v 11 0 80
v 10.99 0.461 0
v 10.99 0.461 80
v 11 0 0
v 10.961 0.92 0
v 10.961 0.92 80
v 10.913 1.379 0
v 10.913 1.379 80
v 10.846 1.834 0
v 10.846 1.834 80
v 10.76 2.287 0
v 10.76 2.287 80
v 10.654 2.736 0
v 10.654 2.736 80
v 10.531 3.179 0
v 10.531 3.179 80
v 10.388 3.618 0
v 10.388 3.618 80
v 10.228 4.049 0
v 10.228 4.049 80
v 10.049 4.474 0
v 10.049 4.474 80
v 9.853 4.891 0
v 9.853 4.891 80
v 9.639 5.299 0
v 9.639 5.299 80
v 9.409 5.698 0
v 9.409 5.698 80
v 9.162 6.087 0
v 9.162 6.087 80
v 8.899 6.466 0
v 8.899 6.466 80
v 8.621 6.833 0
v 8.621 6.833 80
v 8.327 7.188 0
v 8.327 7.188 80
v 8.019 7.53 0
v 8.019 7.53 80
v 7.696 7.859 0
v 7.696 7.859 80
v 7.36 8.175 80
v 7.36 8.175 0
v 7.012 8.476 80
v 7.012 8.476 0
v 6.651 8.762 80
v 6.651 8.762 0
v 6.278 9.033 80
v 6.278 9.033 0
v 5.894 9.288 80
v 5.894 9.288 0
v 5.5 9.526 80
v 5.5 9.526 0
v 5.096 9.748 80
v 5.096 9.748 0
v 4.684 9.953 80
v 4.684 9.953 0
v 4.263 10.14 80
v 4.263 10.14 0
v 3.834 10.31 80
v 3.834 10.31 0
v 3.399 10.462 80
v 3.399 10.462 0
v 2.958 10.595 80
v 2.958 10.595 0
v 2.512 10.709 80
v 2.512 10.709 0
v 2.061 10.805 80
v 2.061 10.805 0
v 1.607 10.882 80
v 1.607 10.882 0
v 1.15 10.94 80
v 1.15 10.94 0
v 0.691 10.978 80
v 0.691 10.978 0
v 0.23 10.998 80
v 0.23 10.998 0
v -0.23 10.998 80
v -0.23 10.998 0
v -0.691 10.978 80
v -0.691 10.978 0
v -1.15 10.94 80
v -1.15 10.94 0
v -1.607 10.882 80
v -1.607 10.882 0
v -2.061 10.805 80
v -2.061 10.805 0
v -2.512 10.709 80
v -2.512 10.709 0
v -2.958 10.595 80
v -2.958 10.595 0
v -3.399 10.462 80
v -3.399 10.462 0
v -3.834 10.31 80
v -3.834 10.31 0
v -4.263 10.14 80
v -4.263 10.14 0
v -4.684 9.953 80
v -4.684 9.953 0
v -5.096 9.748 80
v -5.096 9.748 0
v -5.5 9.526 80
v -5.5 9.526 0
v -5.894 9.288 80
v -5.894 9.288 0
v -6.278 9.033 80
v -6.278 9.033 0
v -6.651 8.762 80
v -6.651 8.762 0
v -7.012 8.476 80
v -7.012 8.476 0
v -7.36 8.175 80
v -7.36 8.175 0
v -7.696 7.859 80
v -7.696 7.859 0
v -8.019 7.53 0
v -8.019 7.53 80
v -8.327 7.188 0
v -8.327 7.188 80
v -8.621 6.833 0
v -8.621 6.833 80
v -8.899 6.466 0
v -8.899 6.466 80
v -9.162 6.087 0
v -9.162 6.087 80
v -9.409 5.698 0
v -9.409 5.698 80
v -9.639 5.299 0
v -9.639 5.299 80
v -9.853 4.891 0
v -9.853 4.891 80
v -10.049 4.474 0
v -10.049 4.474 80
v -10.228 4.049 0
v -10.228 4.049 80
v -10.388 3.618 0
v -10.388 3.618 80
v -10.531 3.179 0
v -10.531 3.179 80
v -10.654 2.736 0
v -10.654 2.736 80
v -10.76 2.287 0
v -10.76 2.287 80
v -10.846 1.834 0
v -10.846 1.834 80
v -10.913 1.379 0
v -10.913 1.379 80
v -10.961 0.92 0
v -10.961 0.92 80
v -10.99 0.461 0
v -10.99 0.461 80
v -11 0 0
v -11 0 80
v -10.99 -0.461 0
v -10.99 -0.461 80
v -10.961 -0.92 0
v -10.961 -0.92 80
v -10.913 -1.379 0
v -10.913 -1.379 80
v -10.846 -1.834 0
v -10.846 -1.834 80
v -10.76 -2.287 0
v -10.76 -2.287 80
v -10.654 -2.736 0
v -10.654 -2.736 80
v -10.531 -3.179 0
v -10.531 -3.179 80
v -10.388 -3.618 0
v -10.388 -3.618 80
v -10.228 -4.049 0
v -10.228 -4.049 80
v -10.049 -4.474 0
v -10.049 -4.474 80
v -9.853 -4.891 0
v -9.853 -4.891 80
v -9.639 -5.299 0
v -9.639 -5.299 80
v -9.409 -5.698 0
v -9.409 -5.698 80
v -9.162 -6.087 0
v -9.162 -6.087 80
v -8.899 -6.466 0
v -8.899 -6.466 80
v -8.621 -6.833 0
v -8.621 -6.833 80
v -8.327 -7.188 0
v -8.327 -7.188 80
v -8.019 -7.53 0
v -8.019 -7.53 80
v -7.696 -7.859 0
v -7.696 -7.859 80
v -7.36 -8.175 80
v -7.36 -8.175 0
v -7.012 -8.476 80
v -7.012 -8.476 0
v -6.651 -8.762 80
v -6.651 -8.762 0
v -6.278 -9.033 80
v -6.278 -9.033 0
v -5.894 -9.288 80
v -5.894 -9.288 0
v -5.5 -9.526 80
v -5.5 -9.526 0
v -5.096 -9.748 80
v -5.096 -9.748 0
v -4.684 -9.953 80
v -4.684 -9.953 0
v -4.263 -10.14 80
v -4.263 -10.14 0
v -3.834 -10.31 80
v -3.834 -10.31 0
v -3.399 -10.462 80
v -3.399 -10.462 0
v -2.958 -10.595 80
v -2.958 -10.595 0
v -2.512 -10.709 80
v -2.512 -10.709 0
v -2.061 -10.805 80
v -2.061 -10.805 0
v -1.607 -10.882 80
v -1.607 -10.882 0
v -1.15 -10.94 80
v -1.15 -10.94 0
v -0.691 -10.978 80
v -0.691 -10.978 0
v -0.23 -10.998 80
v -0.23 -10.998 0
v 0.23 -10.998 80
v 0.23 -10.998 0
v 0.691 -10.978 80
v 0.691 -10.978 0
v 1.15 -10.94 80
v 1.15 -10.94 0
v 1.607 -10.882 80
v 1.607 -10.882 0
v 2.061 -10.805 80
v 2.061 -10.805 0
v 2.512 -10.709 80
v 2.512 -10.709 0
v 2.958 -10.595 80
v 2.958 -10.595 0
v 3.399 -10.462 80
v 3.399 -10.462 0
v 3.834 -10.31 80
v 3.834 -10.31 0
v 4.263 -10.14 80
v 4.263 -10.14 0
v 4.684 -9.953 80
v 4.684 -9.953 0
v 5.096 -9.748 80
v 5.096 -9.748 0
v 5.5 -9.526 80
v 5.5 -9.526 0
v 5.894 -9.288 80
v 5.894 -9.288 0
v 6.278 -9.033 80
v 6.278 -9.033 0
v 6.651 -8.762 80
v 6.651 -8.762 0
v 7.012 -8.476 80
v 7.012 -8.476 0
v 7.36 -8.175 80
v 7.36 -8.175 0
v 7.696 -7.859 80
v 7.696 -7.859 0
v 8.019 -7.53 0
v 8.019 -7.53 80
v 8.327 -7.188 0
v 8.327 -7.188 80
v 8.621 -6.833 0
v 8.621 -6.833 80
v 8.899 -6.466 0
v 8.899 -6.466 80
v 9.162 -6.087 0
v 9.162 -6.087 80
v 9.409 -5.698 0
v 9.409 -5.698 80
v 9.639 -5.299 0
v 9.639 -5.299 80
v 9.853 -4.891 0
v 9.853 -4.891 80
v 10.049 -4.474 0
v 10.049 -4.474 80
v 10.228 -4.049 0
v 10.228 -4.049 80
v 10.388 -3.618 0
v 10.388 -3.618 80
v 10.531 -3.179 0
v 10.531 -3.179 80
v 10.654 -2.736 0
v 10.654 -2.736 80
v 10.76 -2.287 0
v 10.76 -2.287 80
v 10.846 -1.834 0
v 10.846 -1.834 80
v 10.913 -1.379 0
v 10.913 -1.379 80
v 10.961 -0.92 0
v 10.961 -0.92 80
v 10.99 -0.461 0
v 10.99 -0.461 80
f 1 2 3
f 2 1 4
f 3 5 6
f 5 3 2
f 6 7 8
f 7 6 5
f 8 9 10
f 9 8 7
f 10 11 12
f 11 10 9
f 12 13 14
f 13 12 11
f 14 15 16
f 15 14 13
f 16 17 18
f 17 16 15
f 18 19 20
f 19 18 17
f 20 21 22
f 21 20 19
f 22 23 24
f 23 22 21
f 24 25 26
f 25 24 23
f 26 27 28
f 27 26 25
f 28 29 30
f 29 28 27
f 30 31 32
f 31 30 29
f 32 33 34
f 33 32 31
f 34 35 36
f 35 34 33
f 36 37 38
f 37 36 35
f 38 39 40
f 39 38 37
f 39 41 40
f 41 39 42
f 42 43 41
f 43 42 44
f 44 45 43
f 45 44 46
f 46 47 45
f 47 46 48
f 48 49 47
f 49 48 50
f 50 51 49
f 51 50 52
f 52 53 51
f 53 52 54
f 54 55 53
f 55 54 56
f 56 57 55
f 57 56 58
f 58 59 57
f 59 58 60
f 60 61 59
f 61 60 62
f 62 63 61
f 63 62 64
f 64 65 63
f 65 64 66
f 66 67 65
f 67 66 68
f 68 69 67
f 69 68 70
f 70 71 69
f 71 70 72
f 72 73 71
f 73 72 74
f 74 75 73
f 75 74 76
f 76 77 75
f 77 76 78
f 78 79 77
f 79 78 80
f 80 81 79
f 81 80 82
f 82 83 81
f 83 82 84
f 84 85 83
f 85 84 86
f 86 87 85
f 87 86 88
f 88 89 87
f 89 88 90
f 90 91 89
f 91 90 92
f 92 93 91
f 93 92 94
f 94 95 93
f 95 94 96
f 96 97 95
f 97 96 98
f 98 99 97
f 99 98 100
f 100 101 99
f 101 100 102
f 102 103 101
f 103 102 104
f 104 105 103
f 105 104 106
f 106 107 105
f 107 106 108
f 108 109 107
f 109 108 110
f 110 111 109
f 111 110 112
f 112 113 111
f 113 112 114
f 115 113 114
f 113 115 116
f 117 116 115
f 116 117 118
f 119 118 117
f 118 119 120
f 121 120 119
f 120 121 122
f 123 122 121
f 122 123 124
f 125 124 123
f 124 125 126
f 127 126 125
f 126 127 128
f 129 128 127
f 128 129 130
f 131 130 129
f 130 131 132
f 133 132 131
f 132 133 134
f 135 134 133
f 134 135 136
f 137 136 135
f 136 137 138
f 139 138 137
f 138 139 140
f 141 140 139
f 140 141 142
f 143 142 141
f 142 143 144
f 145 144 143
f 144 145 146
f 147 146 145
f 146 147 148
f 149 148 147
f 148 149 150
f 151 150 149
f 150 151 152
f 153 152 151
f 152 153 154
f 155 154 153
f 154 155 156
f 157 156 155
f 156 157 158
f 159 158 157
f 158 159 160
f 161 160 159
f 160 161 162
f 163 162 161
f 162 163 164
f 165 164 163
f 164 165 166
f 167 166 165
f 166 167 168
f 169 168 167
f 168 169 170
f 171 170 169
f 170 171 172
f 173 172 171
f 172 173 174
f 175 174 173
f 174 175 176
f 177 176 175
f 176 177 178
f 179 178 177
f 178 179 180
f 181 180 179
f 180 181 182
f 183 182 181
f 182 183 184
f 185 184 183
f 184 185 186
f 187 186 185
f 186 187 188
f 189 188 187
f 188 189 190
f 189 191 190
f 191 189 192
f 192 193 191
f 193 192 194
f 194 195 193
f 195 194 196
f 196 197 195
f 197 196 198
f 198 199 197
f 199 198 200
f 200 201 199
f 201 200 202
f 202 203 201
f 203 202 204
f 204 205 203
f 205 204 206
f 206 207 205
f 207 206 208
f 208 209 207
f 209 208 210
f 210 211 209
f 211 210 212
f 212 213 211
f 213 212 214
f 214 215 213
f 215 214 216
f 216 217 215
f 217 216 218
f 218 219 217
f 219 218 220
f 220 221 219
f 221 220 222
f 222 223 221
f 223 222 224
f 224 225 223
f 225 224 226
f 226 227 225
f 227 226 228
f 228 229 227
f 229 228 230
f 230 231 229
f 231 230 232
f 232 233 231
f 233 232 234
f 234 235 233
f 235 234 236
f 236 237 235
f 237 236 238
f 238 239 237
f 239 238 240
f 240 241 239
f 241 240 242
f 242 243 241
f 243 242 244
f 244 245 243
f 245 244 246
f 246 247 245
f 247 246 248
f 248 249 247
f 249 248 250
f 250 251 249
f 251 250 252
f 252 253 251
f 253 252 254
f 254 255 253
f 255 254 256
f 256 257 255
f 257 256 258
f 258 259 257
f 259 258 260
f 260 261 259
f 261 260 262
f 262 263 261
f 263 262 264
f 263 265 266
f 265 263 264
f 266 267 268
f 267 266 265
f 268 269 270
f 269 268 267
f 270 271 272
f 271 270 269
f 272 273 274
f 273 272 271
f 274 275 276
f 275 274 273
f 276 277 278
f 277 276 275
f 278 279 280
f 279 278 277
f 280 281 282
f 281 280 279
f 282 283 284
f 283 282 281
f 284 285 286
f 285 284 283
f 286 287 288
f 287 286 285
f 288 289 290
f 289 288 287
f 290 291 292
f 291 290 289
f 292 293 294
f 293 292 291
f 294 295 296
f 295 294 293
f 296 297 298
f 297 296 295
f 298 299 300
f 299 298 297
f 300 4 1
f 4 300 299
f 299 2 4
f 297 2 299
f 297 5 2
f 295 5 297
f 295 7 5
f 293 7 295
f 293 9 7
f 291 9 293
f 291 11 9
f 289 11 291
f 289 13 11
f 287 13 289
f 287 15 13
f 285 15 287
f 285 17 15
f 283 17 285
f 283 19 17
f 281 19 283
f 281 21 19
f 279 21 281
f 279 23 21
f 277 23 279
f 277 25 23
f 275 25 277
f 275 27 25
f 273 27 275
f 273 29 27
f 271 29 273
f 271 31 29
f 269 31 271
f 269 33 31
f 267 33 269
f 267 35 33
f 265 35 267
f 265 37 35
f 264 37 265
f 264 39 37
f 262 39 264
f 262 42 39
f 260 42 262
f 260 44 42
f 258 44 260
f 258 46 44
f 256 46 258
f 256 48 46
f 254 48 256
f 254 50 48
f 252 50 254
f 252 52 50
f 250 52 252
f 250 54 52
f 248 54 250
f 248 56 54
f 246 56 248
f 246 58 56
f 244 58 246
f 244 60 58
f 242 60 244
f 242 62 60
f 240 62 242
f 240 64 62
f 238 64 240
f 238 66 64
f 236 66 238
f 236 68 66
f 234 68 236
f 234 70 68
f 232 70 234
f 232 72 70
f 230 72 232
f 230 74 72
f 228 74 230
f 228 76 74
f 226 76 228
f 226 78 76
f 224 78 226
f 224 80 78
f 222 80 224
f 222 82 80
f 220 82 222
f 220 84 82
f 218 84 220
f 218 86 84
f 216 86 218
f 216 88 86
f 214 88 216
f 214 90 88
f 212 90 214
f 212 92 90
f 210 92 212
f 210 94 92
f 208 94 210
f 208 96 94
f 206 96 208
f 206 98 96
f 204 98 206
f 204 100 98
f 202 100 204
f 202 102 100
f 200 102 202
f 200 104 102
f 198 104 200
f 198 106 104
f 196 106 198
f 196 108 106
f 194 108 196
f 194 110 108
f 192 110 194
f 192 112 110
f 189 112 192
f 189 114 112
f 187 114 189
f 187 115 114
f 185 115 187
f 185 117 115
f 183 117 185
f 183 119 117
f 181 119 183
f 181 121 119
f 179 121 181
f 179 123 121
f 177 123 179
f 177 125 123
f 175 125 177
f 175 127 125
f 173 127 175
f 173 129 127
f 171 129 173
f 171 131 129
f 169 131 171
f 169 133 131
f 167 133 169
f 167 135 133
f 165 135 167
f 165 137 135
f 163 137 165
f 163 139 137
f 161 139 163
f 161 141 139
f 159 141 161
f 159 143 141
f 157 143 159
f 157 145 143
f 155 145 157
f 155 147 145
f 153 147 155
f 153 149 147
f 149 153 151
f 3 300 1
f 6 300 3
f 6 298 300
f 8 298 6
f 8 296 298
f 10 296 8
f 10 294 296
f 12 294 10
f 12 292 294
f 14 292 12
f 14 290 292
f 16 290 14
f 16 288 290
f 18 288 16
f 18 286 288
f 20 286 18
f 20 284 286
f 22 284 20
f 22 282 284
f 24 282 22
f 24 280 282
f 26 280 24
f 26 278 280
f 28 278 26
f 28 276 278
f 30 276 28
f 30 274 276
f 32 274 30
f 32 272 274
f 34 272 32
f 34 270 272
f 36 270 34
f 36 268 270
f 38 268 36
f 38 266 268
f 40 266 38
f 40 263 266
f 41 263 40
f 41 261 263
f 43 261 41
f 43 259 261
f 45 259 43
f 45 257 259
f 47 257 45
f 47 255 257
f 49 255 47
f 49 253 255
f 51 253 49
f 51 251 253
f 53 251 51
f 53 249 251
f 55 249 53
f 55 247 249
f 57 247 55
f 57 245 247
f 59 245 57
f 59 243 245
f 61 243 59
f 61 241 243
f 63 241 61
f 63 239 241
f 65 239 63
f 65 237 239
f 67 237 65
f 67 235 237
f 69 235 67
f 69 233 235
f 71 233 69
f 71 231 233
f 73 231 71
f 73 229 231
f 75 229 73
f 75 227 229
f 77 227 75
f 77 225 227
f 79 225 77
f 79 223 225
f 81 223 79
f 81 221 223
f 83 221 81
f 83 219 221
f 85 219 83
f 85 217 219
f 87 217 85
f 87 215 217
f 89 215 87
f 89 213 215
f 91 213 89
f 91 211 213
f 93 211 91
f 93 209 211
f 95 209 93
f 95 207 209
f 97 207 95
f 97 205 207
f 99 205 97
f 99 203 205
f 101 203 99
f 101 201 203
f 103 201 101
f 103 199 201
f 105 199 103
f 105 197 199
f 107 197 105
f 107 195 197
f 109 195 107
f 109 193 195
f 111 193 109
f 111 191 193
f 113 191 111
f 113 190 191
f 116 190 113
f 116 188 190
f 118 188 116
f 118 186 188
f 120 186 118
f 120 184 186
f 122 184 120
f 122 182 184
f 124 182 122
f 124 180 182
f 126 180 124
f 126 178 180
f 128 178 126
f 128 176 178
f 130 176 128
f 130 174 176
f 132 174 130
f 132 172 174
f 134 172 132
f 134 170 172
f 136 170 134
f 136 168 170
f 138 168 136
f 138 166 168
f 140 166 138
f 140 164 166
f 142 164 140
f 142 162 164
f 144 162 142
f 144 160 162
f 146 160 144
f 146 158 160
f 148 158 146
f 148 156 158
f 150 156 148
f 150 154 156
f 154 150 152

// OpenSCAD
$fn = 150;

color(alpha = 0.5, c = "white") {
	cylinder(d = 22.0, h = 80.0);
}
